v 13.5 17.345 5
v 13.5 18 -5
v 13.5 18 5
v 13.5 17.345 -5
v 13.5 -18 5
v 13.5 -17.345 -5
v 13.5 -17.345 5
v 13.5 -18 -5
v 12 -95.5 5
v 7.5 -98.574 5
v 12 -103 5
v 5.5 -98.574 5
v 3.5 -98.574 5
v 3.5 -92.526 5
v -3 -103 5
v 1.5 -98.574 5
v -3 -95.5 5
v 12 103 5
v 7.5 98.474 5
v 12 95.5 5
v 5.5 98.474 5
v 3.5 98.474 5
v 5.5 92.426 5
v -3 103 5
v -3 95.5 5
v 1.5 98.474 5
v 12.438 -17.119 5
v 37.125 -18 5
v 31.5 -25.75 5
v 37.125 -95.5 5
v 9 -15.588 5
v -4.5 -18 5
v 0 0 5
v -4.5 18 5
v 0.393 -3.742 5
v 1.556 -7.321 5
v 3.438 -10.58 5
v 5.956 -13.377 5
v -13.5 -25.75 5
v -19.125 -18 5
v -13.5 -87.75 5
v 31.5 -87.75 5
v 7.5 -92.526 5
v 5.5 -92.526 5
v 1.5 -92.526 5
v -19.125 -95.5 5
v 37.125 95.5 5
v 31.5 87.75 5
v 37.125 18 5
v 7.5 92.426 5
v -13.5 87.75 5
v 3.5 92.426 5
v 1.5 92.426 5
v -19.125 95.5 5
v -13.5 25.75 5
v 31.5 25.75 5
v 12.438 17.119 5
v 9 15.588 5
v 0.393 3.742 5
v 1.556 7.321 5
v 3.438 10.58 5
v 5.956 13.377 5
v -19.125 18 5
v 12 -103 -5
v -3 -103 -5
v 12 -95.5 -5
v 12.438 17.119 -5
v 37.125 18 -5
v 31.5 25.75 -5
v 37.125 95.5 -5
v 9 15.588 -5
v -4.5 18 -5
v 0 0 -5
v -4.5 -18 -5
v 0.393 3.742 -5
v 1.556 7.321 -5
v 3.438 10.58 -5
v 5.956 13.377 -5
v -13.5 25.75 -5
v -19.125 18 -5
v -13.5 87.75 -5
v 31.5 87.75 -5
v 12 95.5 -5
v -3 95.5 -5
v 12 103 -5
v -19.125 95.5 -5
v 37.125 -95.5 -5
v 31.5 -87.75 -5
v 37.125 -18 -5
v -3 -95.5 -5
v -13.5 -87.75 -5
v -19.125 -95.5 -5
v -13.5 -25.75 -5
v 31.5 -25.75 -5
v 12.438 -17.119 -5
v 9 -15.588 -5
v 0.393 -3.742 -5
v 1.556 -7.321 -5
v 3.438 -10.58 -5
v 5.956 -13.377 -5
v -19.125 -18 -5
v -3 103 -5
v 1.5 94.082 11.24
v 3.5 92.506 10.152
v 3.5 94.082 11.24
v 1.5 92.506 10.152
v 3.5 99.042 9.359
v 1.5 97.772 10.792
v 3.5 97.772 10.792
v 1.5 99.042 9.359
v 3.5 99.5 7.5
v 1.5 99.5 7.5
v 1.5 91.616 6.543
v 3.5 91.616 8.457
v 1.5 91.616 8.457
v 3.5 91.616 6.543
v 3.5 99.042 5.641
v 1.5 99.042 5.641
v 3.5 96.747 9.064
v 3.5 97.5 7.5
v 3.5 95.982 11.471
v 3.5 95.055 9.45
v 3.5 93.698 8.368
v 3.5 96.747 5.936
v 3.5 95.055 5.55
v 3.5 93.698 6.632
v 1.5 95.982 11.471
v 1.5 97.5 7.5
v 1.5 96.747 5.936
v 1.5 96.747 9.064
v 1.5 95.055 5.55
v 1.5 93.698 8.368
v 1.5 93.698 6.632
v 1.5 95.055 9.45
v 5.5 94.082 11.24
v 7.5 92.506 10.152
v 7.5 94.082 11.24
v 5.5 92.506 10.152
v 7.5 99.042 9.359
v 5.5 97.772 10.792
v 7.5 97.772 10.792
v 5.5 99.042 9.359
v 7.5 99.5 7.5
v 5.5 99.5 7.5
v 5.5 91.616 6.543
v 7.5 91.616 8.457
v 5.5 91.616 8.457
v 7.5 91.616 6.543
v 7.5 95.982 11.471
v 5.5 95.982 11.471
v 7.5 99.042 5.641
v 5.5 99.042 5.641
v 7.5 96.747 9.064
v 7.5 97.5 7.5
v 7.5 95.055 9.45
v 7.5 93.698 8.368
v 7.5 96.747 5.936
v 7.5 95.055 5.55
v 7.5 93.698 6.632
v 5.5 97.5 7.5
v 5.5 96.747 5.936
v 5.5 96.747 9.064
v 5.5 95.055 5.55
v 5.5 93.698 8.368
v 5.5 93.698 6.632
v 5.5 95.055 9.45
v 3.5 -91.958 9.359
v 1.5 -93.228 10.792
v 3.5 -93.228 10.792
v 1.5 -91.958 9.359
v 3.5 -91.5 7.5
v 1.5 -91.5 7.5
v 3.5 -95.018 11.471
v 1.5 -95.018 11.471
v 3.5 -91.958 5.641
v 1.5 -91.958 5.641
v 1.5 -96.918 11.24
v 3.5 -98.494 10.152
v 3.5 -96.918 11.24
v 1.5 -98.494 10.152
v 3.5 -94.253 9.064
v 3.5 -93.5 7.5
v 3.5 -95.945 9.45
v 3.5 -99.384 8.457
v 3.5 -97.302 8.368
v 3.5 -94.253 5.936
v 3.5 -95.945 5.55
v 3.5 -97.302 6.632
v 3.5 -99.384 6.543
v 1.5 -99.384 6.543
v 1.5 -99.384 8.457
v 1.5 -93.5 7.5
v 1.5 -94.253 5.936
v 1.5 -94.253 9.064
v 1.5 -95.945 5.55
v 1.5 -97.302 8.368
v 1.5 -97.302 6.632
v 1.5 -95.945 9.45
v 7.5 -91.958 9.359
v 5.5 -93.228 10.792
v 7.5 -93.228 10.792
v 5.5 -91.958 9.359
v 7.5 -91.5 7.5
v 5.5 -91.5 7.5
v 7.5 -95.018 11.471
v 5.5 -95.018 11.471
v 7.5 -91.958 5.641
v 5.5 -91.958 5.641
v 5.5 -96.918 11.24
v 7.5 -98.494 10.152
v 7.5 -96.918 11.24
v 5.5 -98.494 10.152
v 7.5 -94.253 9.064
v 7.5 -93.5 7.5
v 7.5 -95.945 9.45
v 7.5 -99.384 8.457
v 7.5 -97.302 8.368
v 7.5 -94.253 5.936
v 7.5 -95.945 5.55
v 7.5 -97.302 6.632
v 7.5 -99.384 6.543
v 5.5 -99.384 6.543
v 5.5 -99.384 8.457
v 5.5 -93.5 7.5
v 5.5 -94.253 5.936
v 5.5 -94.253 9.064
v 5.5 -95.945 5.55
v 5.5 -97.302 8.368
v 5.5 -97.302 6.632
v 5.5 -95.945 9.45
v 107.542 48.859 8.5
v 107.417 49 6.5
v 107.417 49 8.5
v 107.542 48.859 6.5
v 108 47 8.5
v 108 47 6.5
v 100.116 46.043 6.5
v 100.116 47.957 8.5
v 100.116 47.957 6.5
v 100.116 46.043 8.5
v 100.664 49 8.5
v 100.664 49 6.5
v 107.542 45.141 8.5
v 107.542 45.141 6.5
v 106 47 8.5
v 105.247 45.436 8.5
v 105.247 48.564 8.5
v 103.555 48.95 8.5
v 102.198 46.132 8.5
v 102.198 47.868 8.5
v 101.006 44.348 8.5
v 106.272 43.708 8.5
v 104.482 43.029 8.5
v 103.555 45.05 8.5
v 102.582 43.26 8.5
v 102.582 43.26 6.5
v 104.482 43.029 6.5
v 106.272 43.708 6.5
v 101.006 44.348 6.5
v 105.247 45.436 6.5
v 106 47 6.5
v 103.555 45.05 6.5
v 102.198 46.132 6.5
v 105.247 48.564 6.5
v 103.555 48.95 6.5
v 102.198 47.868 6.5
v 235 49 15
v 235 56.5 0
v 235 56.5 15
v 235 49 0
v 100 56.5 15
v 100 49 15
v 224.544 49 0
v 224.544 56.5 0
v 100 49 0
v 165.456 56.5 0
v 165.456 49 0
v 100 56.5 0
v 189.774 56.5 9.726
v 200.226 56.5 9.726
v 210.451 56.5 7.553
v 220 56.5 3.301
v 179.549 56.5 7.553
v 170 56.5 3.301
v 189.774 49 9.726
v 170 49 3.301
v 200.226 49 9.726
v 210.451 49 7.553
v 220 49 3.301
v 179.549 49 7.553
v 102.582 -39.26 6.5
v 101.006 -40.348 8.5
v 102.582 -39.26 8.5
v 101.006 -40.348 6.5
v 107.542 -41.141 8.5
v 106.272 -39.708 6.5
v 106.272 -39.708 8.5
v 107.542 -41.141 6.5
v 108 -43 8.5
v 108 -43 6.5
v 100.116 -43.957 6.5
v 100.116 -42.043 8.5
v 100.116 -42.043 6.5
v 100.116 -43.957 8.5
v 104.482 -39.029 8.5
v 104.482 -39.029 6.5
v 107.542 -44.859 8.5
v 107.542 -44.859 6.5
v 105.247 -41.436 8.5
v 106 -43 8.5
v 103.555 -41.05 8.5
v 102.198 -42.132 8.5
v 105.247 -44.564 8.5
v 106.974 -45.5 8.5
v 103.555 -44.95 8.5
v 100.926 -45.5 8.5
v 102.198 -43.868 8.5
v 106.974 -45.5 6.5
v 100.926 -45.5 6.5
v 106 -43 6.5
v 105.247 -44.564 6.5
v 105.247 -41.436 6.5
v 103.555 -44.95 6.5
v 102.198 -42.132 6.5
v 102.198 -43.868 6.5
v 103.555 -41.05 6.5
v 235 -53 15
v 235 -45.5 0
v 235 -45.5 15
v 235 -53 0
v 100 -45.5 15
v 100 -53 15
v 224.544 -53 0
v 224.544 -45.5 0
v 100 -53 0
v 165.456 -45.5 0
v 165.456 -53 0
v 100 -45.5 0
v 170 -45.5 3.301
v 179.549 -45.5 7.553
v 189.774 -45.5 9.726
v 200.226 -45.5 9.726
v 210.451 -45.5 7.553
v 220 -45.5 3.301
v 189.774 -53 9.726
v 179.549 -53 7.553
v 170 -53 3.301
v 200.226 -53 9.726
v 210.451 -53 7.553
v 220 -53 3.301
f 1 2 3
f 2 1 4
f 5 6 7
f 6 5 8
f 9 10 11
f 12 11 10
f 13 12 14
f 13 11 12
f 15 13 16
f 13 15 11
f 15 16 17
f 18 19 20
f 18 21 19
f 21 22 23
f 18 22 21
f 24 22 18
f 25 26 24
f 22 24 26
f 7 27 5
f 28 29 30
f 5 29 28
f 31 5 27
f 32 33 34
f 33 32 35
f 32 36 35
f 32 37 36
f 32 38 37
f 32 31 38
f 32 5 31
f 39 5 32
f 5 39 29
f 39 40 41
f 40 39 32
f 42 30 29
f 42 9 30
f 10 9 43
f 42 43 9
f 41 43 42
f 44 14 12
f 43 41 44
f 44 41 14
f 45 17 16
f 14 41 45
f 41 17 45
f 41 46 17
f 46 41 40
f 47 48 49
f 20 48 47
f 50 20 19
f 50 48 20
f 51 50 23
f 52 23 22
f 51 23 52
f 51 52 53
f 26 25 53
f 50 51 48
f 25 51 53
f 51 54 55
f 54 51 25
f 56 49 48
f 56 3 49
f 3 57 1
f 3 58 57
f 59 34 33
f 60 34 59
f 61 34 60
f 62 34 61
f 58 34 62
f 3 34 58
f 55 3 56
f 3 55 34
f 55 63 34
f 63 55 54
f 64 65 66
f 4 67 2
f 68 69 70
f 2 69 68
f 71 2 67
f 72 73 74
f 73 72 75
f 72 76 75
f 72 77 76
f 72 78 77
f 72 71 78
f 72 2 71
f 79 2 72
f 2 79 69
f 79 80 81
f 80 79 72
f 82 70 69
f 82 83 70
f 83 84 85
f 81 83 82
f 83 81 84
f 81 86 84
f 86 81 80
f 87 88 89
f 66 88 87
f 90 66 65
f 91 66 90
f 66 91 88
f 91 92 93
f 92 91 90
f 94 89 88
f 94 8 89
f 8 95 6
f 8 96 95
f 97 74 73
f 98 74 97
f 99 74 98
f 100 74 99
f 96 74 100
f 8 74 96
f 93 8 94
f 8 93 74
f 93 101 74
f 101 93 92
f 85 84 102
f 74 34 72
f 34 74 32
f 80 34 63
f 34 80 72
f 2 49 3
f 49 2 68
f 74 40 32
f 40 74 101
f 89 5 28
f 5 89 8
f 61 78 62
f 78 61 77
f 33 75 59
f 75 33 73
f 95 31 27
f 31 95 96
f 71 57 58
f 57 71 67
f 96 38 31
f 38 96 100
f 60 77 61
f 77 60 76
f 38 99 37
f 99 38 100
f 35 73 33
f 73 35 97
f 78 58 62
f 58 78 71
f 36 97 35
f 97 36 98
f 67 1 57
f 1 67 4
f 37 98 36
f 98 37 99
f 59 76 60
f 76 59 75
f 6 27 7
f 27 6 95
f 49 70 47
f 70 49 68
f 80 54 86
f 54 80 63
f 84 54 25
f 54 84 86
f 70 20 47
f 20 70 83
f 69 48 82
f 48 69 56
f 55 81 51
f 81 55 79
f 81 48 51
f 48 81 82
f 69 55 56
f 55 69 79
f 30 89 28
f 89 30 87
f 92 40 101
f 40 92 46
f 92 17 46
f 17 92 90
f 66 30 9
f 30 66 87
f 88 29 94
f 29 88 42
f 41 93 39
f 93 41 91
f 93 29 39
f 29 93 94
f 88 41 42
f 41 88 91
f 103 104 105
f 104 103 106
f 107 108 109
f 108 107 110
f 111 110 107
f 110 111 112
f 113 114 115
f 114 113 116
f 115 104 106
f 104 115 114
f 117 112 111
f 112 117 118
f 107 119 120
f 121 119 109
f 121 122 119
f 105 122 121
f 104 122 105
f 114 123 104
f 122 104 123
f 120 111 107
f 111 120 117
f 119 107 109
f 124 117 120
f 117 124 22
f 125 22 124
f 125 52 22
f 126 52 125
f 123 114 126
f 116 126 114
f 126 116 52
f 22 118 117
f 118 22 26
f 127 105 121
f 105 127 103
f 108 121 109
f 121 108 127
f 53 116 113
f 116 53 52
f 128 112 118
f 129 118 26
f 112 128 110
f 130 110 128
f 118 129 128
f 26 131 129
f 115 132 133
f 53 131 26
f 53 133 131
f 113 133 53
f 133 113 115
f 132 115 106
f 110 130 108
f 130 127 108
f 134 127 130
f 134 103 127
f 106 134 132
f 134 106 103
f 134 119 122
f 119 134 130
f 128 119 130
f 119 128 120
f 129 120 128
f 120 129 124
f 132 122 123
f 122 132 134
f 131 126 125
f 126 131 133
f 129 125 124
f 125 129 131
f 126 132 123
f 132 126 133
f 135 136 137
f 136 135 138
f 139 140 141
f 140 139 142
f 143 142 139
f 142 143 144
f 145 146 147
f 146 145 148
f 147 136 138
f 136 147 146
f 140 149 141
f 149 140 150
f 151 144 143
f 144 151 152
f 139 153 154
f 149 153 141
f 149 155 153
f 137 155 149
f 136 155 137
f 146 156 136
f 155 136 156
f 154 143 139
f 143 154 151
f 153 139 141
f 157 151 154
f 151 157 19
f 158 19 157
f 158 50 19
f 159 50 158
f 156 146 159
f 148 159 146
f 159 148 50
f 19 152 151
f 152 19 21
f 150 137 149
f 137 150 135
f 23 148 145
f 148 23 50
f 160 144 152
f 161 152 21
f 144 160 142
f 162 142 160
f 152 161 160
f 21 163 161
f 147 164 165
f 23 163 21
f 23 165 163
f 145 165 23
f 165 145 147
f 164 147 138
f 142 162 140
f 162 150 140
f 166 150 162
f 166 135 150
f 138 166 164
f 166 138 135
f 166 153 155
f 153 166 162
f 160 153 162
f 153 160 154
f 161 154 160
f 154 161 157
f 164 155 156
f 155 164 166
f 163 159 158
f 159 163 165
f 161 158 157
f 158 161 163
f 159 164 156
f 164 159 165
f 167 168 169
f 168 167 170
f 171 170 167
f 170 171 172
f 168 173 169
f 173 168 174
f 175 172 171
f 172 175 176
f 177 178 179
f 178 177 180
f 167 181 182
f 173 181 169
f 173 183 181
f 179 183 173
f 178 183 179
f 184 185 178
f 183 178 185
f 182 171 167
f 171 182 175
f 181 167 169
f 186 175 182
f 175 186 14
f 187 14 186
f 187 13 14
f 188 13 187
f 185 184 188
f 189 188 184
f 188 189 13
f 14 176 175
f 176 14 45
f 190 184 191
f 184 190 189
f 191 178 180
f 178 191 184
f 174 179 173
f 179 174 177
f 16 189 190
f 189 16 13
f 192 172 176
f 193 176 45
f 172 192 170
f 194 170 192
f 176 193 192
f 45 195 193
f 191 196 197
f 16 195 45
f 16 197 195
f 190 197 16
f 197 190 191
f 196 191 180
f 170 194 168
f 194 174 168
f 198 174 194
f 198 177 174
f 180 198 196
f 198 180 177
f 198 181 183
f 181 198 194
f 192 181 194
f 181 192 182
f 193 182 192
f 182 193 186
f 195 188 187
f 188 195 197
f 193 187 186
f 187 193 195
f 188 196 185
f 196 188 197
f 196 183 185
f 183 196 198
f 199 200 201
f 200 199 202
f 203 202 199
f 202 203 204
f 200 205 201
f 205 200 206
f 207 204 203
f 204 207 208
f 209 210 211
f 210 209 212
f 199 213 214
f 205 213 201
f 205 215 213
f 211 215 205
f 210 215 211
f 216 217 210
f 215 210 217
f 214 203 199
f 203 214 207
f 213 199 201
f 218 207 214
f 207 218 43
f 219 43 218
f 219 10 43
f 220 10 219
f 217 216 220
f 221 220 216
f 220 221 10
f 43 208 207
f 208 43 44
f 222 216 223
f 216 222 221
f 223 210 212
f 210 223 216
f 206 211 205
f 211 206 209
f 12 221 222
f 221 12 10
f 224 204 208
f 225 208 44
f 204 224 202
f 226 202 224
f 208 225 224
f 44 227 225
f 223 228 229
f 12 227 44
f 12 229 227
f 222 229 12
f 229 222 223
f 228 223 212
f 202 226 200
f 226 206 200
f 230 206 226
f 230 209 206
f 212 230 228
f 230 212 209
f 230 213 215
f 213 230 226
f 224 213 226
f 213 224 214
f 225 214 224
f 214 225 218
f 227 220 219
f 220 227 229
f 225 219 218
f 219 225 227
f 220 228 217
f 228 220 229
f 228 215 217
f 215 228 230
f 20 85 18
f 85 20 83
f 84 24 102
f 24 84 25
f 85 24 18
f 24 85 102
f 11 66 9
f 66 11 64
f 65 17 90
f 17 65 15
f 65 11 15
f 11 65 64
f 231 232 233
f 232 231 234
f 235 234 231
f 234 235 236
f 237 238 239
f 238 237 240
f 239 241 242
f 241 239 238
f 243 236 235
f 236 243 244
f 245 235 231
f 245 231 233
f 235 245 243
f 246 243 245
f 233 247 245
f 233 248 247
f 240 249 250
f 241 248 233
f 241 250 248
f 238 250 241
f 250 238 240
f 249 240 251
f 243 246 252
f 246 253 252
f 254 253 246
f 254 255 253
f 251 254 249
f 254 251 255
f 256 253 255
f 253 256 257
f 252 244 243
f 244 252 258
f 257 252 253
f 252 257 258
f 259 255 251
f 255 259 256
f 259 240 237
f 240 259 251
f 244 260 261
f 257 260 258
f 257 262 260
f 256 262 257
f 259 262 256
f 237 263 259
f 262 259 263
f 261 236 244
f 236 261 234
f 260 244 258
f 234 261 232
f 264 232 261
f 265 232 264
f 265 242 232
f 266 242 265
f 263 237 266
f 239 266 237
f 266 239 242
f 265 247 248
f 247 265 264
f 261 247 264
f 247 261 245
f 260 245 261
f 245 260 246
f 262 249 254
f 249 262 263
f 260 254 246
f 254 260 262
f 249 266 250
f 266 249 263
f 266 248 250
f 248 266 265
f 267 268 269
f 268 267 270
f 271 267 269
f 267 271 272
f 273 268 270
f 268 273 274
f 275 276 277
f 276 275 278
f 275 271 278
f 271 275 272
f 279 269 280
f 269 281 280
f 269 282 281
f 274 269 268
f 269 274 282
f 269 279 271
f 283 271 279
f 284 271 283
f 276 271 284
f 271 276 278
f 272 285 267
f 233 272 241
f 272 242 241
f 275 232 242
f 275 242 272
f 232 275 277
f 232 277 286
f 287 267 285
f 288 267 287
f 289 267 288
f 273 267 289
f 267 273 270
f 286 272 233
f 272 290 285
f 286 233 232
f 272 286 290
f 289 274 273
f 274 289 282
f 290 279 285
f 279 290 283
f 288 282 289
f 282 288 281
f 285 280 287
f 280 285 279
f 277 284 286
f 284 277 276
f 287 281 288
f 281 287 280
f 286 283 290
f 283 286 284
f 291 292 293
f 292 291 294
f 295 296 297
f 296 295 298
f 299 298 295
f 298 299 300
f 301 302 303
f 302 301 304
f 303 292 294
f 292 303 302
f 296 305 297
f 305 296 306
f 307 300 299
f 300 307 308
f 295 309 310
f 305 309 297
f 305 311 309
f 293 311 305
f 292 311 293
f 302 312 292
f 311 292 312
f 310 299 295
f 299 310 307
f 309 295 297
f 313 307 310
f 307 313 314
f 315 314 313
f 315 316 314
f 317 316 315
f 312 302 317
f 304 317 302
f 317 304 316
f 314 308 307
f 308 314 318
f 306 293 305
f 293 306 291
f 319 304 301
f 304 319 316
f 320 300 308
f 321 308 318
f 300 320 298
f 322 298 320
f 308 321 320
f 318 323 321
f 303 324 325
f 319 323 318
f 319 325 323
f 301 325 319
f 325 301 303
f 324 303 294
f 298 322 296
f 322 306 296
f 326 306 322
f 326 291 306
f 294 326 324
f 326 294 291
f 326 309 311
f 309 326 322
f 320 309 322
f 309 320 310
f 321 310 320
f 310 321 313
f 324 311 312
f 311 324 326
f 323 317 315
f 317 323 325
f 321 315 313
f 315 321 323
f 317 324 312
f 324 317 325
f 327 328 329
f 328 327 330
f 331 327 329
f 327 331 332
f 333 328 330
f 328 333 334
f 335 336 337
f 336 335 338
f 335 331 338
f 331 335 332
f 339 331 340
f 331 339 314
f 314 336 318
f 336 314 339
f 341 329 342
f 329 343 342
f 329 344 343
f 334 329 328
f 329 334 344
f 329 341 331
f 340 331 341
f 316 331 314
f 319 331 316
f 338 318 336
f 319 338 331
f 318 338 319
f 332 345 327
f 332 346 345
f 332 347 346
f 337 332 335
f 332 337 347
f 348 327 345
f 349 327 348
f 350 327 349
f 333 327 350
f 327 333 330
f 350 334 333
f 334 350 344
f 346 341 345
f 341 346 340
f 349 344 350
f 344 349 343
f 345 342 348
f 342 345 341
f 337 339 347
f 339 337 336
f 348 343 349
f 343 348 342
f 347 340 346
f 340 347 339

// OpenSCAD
bridge = 18; // [14:24]
lensheight = 45; // [24:40]
lenswidth = 62; //  [40:62]
thickness = 10; // [3:10]
framewidth = 2*bridge + (lenswidth*1.25);
module glassesframe()
{
// Bridge
    difference() {
        translate([.25*(bridge),0,0])
        cube([(bridge),2*bridge,thickness],center = true);
        translate([bridge,0,0])
        cylinder(h = thickness+1, r = bridge, center = true);
    }
// Right Lens
    difference(){
        translate([bridge/2,framewidth/2,0])
        cube([1.25*(lensheight),1.25*(lenswidth),thickness],center = true);
        translate([bridge/2,framewidth/2,0])
        cube([lensheight,lenswidth,thickness+1], center = true);
    }
// Left Lens
    difference(){
        translate([bridge/2,-(framewidth/2),0])
        cube([1.25*(lensheight),1.25*(lenswidth),thickness],center = true);
        translate([bridge/2,-(framewidth/2),0])
        cube([lensheight,lenswidth,thickness+1], center = true);
    }
// Right Screw Holes  
    difference(){
        translate([.25*bridge-2,(framewidth-bridge),.75*thickness])
        rotate([90,0,90])
        cylinder(h = 2, r = 4, center = true);
        translate([.25*bridge-2,(framewidth-bridge),.75*thickness])
        rotate([90,0,90])
        cylinder(h = 3, r = 2, center = true);
    }
    difference(){
        translate([.25*bridge+2,(framewidth-bridge),.75*thickness])
        rotate([90,0,90])
        cylinder(h = 2, r = 4, center = true);
        translate([.25*bridge+2,(framewidth-bridge),.75*thickness])
        rotate([90,0,90])
        cylinder(h = 3, r = 2, center = true);
    }
//Left Screw Holes
    difference(){
        translate([.25*bridge-2,-(framewidth-bridge),.75*thickness])
        rotate([90,0,90])
        cylinder(h = 2, r = 4, center = true);
        translate([.25*bridge-2,-(framewidth-bridge),.75*thickness])
        rotate([90,0,90])
        cylinder(h = 3, r = 2, center = true);
    }
    difference(){
        translate([.25*bridge+2,-(framewidth-bridge),.75*thickness])
        rotate([90,0,90])
        cylinder(h = 2, r = 4, center = true);
        translate([.25*bridge+2,-(framewidth-bridge),.75*thickness])
        rotate([90,0,90])
        cylinder(h = 3, r = 2, center = true);
    }
//Screw Hole Platforms
    translate([.25*bridge,framewidth-bridge,0])
    cube([lensheight/3,lensheight/3,thickness], center = true);
    translate([.25*bridge,-(framewidth-bridge),0])
    cube([lensheight/3,lensheight/3,thickness], center = true);
}

glassesframe();

templelength = 135; //    [120:150]
module temple()
{
//  Right Arm
      difference(){
          translate([104,lensheight+2,lensheight/6])
          cylinder(h = 2, r = 4, center = true);
          translate([104,lensheight+2,lensheight/6])
          cylinder(h = 3, r = 2, center = true);    
      }
      difference(){
          translate([100,49,0])
          cube([templelength,lensheight/6,lensheight/3]);  
          translate([templelength+60,lensheight,-40])
          rotate([90,0,0])
          cylinder(h=30, r=50, center = true);
            
          }
//  Left Arm
      difference(){
          translate([104,-lensheight+2,lensheight/6])
          cylinder(h = 2, r = 4, center = true);
          translate([104,-lensheight+2,lensheight/6])
          cylinder(h = 3, r = 2, center = true);    
      }
      difference(){
          translate([100,-53,0])
          cube([templelength,lensheight/6,lensheight/3]);  
          translate([templelength+60,-lensheight,-40])
          rotate([90,0,0])
          cylinder(h=30, r=50, center = true);
            
          }
}

  temple();
